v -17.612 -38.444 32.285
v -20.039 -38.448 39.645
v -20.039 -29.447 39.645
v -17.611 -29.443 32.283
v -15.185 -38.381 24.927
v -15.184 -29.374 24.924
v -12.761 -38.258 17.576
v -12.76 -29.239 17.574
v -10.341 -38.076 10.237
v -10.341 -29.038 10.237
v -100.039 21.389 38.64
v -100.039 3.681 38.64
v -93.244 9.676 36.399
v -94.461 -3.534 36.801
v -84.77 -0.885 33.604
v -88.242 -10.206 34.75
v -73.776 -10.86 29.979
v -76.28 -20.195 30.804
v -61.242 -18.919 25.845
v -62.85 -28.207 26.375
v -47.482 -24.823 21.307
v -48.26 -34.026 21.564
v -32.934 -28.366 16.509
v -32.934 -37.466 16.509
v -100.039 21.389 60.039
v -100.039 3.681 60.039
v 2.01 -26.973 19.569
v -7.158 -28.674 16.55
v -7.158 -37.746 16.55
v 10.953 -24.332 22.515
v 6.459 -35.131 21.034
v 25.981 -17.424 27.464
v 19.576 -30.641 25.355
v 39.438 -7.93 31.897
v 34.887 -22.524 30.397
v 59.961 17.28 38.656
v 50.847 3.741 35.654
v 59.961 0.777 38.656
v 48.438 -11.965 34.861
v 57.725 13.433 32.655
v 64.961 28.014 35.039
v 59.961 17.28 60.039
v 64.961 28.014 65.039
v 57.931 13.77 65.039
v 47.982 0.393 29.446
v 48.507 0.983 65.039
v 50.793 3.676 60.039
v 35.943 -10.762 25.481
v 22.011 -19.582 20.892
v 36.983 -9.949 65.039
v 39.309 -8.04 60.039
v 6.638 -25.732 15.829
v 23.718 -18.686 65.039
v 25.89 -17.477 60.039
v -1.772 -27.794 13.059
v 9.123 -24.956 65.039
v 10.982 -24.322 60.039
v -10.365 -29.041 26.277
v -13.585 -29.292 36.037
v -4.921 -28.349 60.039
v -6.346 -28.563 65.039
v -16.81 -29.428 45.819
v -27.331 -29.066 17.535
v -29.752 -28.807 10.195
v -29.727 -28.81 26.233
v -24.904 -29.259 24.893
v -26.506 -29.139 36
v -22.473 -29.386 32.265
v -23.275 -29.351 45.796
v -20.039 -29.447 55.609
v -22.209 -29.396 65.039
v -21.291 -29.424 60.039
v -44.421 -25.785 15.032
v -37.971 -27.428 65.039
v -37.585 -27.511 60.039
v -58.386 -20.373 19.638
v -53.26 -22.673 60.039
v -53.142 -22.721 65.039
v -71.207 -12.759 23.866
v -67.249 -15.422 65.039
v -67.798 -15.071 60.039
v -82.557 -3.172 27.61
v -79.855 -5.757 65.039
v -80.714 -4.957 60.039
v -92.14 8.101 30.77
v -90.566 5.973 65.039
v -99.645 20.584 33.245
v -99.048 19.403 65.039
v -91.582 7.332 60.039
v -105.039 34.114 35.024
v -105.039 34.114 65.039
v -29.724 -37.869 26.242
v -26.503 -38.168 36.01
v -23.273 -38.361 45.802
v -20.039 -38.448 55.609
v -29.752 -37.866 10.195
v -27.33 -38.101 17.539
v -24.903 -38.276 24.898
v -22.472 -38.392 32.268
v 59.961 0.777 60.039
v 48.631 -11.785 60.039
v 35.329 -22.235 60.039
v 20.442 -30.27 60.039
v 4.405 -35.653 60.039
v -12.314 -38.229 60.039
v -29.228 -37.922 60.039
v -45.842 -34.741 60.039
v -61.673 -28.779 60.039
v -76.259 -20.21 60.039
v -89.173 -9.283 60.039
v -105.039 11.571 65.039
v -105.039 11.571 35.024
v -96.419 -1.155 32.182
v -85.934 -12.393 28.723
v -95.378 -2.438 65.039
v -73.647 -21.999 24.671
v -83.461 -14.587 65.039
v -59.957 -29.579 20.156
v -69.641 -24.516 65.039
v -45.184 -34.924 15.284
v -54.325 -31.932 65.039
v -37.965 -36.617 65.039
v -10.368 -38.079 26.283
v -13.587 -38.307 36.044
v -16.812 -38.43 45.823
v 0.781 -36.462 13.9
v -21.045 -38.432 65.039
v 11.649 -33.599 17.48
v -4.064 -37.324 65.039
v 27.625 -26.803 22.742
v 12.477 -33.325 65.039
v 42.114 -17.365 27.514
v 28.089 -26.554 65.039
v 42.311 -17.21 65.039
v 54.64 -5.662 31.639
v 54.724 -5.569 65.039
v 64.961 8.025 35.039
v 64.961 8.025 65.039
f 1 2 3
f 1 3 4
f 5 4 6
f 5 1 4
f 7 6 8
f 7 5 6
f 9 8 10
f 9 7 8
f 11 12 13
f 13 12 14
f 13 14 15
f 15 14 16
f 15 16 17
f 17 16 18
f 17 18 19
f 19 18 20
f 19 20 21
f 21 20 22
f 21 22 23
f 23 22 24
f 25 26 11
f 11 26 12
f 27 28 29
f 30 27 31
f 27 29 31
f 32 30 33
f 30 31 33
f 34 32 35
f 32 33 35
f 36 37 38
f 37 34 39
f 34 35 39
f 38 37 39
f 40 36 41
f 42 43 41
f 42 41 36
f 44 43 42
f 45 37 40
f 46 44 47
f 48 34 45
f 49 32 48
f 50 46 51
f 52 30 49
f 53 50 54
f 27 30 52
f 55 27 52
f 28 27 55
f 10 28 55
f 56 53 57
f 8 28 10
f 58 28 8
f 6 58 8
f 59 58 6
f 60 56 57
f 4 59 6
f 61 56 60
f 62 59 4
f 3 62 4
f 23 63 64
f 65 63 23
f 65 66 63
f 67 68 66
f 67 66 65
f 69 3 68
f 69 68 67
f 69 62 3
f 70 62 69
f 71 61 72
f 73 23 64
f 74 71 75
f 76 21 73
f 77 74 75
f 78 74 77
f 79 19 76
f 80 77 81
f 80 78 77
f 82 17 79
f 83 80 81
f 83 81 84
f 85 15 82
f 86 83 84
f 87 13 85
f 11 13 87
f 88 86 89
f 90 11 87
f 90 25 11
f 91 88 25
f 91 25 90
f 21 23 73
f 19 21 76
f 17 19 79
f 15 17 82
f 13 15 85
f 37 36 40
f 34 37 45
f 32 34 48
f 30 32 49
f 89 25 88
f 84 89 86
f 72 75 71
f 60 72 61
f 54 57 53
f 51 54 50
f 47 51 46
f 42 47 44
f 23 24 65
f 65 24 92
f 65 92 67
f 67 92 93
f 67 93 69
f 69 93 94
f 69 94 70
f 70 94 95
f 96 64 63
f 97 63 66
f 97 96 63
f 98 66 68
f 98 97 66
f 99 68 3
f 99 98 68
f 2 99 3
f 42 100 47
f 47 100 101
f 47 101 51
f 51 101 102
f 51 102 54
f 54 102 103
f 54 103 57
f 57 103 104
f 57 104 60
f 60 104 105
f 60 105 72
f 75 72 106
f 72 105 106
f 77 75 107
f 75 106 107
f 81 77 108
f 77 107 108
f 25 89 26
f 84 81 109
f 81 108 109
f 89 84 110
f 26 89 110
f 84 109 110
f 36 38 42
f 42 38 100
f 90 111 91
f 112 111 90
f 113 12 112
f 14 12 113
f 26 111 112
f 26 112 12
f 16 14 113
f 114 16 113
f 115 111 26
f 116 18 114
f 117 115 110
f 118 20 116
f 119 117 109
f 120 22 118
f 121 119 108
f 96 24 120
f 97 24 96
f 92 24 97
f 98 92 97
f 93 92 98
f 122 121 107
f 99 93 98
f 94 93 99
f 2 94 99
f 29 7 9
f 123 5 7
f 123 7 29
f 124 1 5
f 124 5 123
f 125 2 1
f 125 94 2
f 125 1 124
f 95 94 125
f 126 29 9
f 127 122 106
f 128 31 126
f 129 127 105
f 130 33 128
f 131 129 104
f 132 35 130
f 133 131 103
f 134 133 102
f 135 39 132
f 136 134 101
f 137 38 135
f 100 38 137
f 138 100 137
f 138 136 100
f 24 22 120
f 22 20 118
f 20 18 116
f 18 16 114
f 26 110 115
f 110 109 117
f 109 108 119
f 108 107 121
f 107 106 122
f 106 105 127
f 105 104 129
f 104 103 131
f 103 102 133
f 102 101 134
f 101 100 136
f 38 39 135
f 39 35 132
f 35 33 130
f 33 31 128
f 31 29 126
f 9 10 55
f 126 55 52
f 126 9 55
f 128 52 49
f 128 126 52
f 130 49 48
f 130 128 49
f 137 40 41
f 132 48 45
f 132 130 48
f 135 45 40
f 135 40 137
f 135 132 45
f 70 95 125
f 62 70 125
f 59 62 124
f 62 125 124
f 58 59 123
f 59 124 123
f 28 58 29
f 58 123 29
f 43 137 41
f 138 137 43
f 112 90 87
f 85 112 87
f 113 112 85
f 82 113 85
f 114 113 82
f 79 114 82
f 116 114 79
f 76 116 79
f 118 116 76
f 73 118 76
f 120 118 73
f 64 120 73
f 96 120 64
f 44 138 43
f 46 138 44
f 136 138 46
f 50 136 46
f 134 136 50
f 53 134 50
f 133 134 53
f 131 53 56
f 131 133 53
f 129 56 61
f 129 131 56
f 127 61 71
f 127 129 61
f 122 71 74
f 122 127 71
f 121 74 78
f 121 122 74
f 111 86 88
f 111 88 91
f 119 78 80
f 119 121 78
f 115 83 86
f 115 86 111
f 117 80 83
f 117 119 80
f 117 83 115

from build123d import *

# Parameters (mm, degrees)
F1_DEPTH = 75
F4_DEPTH = 200
F5_DEPTH = 100


# Not quite as in the source:
# - ends of sketch curves that miss each other by under 0.0002 mm in the source are joined


with BuildPart() as f1:
    # F0 (on Front) → F1 (new body, symmetric)
    with BuildSketch(Plane.XZ):
        Polygon((64.9607930725, 65.0385569036), (-20.0392069275, 65.0385569036), (-105.0392069275, 65.0385569036), (-105.0392069275, 35.0244045258), (-29.7518869333, 10.1945746155), (-20.0392069275, 39.6446734667), (-10.3405706844, 10.2371571158), (64.9607930725, 35.0385569036), align=None)
    extrude(amount=F1_DEPTH, both=True)

    # F2 (on face) → F4 (cut)
    with BuildSketch(Plane.XZ.offset(75)):
        Polygon((-100.0392069275, 38.640326764), (-32.9342746626, 16.5090348727), (-20.0392069275, 55.6085438923), (-7.1575624177, 16.5497358238), (59.9607930725, 38.6559645103), (59.9607930725, 60.0385569036), (-100.0392069275, 60.0385569036), align=None)
    extrude(amount=-F4_DEPTH, mode=Mode.SUBTRACT)

    # F3 (on face) → F5 (intersect)
    with BuildSketch(Plane.XY.offset(65.0385569036)):
        with BuildLine():
            Line((-107.177117556, 42.4698600353), (-115.9930899739, 40.6591594219))
            ThreePointArc((-115.9930899739, 40.6591594219), (-18.9798846841, -38.4537255363), (78.0333206058, 40.6591594219))
            Line((78.0333206058, 40.6591594219), (69.2173481878, 42.4698600353))
            ThreePointArc((69.2173481878, 42.4698600353), (-18.9798846841, -29.4537251816), (-107.177117556, 42.4698600353))
        make_face()
    extrude(amount=-F5_DEPTH, mode=Mode.INTERSECT)


solid = f1.part
